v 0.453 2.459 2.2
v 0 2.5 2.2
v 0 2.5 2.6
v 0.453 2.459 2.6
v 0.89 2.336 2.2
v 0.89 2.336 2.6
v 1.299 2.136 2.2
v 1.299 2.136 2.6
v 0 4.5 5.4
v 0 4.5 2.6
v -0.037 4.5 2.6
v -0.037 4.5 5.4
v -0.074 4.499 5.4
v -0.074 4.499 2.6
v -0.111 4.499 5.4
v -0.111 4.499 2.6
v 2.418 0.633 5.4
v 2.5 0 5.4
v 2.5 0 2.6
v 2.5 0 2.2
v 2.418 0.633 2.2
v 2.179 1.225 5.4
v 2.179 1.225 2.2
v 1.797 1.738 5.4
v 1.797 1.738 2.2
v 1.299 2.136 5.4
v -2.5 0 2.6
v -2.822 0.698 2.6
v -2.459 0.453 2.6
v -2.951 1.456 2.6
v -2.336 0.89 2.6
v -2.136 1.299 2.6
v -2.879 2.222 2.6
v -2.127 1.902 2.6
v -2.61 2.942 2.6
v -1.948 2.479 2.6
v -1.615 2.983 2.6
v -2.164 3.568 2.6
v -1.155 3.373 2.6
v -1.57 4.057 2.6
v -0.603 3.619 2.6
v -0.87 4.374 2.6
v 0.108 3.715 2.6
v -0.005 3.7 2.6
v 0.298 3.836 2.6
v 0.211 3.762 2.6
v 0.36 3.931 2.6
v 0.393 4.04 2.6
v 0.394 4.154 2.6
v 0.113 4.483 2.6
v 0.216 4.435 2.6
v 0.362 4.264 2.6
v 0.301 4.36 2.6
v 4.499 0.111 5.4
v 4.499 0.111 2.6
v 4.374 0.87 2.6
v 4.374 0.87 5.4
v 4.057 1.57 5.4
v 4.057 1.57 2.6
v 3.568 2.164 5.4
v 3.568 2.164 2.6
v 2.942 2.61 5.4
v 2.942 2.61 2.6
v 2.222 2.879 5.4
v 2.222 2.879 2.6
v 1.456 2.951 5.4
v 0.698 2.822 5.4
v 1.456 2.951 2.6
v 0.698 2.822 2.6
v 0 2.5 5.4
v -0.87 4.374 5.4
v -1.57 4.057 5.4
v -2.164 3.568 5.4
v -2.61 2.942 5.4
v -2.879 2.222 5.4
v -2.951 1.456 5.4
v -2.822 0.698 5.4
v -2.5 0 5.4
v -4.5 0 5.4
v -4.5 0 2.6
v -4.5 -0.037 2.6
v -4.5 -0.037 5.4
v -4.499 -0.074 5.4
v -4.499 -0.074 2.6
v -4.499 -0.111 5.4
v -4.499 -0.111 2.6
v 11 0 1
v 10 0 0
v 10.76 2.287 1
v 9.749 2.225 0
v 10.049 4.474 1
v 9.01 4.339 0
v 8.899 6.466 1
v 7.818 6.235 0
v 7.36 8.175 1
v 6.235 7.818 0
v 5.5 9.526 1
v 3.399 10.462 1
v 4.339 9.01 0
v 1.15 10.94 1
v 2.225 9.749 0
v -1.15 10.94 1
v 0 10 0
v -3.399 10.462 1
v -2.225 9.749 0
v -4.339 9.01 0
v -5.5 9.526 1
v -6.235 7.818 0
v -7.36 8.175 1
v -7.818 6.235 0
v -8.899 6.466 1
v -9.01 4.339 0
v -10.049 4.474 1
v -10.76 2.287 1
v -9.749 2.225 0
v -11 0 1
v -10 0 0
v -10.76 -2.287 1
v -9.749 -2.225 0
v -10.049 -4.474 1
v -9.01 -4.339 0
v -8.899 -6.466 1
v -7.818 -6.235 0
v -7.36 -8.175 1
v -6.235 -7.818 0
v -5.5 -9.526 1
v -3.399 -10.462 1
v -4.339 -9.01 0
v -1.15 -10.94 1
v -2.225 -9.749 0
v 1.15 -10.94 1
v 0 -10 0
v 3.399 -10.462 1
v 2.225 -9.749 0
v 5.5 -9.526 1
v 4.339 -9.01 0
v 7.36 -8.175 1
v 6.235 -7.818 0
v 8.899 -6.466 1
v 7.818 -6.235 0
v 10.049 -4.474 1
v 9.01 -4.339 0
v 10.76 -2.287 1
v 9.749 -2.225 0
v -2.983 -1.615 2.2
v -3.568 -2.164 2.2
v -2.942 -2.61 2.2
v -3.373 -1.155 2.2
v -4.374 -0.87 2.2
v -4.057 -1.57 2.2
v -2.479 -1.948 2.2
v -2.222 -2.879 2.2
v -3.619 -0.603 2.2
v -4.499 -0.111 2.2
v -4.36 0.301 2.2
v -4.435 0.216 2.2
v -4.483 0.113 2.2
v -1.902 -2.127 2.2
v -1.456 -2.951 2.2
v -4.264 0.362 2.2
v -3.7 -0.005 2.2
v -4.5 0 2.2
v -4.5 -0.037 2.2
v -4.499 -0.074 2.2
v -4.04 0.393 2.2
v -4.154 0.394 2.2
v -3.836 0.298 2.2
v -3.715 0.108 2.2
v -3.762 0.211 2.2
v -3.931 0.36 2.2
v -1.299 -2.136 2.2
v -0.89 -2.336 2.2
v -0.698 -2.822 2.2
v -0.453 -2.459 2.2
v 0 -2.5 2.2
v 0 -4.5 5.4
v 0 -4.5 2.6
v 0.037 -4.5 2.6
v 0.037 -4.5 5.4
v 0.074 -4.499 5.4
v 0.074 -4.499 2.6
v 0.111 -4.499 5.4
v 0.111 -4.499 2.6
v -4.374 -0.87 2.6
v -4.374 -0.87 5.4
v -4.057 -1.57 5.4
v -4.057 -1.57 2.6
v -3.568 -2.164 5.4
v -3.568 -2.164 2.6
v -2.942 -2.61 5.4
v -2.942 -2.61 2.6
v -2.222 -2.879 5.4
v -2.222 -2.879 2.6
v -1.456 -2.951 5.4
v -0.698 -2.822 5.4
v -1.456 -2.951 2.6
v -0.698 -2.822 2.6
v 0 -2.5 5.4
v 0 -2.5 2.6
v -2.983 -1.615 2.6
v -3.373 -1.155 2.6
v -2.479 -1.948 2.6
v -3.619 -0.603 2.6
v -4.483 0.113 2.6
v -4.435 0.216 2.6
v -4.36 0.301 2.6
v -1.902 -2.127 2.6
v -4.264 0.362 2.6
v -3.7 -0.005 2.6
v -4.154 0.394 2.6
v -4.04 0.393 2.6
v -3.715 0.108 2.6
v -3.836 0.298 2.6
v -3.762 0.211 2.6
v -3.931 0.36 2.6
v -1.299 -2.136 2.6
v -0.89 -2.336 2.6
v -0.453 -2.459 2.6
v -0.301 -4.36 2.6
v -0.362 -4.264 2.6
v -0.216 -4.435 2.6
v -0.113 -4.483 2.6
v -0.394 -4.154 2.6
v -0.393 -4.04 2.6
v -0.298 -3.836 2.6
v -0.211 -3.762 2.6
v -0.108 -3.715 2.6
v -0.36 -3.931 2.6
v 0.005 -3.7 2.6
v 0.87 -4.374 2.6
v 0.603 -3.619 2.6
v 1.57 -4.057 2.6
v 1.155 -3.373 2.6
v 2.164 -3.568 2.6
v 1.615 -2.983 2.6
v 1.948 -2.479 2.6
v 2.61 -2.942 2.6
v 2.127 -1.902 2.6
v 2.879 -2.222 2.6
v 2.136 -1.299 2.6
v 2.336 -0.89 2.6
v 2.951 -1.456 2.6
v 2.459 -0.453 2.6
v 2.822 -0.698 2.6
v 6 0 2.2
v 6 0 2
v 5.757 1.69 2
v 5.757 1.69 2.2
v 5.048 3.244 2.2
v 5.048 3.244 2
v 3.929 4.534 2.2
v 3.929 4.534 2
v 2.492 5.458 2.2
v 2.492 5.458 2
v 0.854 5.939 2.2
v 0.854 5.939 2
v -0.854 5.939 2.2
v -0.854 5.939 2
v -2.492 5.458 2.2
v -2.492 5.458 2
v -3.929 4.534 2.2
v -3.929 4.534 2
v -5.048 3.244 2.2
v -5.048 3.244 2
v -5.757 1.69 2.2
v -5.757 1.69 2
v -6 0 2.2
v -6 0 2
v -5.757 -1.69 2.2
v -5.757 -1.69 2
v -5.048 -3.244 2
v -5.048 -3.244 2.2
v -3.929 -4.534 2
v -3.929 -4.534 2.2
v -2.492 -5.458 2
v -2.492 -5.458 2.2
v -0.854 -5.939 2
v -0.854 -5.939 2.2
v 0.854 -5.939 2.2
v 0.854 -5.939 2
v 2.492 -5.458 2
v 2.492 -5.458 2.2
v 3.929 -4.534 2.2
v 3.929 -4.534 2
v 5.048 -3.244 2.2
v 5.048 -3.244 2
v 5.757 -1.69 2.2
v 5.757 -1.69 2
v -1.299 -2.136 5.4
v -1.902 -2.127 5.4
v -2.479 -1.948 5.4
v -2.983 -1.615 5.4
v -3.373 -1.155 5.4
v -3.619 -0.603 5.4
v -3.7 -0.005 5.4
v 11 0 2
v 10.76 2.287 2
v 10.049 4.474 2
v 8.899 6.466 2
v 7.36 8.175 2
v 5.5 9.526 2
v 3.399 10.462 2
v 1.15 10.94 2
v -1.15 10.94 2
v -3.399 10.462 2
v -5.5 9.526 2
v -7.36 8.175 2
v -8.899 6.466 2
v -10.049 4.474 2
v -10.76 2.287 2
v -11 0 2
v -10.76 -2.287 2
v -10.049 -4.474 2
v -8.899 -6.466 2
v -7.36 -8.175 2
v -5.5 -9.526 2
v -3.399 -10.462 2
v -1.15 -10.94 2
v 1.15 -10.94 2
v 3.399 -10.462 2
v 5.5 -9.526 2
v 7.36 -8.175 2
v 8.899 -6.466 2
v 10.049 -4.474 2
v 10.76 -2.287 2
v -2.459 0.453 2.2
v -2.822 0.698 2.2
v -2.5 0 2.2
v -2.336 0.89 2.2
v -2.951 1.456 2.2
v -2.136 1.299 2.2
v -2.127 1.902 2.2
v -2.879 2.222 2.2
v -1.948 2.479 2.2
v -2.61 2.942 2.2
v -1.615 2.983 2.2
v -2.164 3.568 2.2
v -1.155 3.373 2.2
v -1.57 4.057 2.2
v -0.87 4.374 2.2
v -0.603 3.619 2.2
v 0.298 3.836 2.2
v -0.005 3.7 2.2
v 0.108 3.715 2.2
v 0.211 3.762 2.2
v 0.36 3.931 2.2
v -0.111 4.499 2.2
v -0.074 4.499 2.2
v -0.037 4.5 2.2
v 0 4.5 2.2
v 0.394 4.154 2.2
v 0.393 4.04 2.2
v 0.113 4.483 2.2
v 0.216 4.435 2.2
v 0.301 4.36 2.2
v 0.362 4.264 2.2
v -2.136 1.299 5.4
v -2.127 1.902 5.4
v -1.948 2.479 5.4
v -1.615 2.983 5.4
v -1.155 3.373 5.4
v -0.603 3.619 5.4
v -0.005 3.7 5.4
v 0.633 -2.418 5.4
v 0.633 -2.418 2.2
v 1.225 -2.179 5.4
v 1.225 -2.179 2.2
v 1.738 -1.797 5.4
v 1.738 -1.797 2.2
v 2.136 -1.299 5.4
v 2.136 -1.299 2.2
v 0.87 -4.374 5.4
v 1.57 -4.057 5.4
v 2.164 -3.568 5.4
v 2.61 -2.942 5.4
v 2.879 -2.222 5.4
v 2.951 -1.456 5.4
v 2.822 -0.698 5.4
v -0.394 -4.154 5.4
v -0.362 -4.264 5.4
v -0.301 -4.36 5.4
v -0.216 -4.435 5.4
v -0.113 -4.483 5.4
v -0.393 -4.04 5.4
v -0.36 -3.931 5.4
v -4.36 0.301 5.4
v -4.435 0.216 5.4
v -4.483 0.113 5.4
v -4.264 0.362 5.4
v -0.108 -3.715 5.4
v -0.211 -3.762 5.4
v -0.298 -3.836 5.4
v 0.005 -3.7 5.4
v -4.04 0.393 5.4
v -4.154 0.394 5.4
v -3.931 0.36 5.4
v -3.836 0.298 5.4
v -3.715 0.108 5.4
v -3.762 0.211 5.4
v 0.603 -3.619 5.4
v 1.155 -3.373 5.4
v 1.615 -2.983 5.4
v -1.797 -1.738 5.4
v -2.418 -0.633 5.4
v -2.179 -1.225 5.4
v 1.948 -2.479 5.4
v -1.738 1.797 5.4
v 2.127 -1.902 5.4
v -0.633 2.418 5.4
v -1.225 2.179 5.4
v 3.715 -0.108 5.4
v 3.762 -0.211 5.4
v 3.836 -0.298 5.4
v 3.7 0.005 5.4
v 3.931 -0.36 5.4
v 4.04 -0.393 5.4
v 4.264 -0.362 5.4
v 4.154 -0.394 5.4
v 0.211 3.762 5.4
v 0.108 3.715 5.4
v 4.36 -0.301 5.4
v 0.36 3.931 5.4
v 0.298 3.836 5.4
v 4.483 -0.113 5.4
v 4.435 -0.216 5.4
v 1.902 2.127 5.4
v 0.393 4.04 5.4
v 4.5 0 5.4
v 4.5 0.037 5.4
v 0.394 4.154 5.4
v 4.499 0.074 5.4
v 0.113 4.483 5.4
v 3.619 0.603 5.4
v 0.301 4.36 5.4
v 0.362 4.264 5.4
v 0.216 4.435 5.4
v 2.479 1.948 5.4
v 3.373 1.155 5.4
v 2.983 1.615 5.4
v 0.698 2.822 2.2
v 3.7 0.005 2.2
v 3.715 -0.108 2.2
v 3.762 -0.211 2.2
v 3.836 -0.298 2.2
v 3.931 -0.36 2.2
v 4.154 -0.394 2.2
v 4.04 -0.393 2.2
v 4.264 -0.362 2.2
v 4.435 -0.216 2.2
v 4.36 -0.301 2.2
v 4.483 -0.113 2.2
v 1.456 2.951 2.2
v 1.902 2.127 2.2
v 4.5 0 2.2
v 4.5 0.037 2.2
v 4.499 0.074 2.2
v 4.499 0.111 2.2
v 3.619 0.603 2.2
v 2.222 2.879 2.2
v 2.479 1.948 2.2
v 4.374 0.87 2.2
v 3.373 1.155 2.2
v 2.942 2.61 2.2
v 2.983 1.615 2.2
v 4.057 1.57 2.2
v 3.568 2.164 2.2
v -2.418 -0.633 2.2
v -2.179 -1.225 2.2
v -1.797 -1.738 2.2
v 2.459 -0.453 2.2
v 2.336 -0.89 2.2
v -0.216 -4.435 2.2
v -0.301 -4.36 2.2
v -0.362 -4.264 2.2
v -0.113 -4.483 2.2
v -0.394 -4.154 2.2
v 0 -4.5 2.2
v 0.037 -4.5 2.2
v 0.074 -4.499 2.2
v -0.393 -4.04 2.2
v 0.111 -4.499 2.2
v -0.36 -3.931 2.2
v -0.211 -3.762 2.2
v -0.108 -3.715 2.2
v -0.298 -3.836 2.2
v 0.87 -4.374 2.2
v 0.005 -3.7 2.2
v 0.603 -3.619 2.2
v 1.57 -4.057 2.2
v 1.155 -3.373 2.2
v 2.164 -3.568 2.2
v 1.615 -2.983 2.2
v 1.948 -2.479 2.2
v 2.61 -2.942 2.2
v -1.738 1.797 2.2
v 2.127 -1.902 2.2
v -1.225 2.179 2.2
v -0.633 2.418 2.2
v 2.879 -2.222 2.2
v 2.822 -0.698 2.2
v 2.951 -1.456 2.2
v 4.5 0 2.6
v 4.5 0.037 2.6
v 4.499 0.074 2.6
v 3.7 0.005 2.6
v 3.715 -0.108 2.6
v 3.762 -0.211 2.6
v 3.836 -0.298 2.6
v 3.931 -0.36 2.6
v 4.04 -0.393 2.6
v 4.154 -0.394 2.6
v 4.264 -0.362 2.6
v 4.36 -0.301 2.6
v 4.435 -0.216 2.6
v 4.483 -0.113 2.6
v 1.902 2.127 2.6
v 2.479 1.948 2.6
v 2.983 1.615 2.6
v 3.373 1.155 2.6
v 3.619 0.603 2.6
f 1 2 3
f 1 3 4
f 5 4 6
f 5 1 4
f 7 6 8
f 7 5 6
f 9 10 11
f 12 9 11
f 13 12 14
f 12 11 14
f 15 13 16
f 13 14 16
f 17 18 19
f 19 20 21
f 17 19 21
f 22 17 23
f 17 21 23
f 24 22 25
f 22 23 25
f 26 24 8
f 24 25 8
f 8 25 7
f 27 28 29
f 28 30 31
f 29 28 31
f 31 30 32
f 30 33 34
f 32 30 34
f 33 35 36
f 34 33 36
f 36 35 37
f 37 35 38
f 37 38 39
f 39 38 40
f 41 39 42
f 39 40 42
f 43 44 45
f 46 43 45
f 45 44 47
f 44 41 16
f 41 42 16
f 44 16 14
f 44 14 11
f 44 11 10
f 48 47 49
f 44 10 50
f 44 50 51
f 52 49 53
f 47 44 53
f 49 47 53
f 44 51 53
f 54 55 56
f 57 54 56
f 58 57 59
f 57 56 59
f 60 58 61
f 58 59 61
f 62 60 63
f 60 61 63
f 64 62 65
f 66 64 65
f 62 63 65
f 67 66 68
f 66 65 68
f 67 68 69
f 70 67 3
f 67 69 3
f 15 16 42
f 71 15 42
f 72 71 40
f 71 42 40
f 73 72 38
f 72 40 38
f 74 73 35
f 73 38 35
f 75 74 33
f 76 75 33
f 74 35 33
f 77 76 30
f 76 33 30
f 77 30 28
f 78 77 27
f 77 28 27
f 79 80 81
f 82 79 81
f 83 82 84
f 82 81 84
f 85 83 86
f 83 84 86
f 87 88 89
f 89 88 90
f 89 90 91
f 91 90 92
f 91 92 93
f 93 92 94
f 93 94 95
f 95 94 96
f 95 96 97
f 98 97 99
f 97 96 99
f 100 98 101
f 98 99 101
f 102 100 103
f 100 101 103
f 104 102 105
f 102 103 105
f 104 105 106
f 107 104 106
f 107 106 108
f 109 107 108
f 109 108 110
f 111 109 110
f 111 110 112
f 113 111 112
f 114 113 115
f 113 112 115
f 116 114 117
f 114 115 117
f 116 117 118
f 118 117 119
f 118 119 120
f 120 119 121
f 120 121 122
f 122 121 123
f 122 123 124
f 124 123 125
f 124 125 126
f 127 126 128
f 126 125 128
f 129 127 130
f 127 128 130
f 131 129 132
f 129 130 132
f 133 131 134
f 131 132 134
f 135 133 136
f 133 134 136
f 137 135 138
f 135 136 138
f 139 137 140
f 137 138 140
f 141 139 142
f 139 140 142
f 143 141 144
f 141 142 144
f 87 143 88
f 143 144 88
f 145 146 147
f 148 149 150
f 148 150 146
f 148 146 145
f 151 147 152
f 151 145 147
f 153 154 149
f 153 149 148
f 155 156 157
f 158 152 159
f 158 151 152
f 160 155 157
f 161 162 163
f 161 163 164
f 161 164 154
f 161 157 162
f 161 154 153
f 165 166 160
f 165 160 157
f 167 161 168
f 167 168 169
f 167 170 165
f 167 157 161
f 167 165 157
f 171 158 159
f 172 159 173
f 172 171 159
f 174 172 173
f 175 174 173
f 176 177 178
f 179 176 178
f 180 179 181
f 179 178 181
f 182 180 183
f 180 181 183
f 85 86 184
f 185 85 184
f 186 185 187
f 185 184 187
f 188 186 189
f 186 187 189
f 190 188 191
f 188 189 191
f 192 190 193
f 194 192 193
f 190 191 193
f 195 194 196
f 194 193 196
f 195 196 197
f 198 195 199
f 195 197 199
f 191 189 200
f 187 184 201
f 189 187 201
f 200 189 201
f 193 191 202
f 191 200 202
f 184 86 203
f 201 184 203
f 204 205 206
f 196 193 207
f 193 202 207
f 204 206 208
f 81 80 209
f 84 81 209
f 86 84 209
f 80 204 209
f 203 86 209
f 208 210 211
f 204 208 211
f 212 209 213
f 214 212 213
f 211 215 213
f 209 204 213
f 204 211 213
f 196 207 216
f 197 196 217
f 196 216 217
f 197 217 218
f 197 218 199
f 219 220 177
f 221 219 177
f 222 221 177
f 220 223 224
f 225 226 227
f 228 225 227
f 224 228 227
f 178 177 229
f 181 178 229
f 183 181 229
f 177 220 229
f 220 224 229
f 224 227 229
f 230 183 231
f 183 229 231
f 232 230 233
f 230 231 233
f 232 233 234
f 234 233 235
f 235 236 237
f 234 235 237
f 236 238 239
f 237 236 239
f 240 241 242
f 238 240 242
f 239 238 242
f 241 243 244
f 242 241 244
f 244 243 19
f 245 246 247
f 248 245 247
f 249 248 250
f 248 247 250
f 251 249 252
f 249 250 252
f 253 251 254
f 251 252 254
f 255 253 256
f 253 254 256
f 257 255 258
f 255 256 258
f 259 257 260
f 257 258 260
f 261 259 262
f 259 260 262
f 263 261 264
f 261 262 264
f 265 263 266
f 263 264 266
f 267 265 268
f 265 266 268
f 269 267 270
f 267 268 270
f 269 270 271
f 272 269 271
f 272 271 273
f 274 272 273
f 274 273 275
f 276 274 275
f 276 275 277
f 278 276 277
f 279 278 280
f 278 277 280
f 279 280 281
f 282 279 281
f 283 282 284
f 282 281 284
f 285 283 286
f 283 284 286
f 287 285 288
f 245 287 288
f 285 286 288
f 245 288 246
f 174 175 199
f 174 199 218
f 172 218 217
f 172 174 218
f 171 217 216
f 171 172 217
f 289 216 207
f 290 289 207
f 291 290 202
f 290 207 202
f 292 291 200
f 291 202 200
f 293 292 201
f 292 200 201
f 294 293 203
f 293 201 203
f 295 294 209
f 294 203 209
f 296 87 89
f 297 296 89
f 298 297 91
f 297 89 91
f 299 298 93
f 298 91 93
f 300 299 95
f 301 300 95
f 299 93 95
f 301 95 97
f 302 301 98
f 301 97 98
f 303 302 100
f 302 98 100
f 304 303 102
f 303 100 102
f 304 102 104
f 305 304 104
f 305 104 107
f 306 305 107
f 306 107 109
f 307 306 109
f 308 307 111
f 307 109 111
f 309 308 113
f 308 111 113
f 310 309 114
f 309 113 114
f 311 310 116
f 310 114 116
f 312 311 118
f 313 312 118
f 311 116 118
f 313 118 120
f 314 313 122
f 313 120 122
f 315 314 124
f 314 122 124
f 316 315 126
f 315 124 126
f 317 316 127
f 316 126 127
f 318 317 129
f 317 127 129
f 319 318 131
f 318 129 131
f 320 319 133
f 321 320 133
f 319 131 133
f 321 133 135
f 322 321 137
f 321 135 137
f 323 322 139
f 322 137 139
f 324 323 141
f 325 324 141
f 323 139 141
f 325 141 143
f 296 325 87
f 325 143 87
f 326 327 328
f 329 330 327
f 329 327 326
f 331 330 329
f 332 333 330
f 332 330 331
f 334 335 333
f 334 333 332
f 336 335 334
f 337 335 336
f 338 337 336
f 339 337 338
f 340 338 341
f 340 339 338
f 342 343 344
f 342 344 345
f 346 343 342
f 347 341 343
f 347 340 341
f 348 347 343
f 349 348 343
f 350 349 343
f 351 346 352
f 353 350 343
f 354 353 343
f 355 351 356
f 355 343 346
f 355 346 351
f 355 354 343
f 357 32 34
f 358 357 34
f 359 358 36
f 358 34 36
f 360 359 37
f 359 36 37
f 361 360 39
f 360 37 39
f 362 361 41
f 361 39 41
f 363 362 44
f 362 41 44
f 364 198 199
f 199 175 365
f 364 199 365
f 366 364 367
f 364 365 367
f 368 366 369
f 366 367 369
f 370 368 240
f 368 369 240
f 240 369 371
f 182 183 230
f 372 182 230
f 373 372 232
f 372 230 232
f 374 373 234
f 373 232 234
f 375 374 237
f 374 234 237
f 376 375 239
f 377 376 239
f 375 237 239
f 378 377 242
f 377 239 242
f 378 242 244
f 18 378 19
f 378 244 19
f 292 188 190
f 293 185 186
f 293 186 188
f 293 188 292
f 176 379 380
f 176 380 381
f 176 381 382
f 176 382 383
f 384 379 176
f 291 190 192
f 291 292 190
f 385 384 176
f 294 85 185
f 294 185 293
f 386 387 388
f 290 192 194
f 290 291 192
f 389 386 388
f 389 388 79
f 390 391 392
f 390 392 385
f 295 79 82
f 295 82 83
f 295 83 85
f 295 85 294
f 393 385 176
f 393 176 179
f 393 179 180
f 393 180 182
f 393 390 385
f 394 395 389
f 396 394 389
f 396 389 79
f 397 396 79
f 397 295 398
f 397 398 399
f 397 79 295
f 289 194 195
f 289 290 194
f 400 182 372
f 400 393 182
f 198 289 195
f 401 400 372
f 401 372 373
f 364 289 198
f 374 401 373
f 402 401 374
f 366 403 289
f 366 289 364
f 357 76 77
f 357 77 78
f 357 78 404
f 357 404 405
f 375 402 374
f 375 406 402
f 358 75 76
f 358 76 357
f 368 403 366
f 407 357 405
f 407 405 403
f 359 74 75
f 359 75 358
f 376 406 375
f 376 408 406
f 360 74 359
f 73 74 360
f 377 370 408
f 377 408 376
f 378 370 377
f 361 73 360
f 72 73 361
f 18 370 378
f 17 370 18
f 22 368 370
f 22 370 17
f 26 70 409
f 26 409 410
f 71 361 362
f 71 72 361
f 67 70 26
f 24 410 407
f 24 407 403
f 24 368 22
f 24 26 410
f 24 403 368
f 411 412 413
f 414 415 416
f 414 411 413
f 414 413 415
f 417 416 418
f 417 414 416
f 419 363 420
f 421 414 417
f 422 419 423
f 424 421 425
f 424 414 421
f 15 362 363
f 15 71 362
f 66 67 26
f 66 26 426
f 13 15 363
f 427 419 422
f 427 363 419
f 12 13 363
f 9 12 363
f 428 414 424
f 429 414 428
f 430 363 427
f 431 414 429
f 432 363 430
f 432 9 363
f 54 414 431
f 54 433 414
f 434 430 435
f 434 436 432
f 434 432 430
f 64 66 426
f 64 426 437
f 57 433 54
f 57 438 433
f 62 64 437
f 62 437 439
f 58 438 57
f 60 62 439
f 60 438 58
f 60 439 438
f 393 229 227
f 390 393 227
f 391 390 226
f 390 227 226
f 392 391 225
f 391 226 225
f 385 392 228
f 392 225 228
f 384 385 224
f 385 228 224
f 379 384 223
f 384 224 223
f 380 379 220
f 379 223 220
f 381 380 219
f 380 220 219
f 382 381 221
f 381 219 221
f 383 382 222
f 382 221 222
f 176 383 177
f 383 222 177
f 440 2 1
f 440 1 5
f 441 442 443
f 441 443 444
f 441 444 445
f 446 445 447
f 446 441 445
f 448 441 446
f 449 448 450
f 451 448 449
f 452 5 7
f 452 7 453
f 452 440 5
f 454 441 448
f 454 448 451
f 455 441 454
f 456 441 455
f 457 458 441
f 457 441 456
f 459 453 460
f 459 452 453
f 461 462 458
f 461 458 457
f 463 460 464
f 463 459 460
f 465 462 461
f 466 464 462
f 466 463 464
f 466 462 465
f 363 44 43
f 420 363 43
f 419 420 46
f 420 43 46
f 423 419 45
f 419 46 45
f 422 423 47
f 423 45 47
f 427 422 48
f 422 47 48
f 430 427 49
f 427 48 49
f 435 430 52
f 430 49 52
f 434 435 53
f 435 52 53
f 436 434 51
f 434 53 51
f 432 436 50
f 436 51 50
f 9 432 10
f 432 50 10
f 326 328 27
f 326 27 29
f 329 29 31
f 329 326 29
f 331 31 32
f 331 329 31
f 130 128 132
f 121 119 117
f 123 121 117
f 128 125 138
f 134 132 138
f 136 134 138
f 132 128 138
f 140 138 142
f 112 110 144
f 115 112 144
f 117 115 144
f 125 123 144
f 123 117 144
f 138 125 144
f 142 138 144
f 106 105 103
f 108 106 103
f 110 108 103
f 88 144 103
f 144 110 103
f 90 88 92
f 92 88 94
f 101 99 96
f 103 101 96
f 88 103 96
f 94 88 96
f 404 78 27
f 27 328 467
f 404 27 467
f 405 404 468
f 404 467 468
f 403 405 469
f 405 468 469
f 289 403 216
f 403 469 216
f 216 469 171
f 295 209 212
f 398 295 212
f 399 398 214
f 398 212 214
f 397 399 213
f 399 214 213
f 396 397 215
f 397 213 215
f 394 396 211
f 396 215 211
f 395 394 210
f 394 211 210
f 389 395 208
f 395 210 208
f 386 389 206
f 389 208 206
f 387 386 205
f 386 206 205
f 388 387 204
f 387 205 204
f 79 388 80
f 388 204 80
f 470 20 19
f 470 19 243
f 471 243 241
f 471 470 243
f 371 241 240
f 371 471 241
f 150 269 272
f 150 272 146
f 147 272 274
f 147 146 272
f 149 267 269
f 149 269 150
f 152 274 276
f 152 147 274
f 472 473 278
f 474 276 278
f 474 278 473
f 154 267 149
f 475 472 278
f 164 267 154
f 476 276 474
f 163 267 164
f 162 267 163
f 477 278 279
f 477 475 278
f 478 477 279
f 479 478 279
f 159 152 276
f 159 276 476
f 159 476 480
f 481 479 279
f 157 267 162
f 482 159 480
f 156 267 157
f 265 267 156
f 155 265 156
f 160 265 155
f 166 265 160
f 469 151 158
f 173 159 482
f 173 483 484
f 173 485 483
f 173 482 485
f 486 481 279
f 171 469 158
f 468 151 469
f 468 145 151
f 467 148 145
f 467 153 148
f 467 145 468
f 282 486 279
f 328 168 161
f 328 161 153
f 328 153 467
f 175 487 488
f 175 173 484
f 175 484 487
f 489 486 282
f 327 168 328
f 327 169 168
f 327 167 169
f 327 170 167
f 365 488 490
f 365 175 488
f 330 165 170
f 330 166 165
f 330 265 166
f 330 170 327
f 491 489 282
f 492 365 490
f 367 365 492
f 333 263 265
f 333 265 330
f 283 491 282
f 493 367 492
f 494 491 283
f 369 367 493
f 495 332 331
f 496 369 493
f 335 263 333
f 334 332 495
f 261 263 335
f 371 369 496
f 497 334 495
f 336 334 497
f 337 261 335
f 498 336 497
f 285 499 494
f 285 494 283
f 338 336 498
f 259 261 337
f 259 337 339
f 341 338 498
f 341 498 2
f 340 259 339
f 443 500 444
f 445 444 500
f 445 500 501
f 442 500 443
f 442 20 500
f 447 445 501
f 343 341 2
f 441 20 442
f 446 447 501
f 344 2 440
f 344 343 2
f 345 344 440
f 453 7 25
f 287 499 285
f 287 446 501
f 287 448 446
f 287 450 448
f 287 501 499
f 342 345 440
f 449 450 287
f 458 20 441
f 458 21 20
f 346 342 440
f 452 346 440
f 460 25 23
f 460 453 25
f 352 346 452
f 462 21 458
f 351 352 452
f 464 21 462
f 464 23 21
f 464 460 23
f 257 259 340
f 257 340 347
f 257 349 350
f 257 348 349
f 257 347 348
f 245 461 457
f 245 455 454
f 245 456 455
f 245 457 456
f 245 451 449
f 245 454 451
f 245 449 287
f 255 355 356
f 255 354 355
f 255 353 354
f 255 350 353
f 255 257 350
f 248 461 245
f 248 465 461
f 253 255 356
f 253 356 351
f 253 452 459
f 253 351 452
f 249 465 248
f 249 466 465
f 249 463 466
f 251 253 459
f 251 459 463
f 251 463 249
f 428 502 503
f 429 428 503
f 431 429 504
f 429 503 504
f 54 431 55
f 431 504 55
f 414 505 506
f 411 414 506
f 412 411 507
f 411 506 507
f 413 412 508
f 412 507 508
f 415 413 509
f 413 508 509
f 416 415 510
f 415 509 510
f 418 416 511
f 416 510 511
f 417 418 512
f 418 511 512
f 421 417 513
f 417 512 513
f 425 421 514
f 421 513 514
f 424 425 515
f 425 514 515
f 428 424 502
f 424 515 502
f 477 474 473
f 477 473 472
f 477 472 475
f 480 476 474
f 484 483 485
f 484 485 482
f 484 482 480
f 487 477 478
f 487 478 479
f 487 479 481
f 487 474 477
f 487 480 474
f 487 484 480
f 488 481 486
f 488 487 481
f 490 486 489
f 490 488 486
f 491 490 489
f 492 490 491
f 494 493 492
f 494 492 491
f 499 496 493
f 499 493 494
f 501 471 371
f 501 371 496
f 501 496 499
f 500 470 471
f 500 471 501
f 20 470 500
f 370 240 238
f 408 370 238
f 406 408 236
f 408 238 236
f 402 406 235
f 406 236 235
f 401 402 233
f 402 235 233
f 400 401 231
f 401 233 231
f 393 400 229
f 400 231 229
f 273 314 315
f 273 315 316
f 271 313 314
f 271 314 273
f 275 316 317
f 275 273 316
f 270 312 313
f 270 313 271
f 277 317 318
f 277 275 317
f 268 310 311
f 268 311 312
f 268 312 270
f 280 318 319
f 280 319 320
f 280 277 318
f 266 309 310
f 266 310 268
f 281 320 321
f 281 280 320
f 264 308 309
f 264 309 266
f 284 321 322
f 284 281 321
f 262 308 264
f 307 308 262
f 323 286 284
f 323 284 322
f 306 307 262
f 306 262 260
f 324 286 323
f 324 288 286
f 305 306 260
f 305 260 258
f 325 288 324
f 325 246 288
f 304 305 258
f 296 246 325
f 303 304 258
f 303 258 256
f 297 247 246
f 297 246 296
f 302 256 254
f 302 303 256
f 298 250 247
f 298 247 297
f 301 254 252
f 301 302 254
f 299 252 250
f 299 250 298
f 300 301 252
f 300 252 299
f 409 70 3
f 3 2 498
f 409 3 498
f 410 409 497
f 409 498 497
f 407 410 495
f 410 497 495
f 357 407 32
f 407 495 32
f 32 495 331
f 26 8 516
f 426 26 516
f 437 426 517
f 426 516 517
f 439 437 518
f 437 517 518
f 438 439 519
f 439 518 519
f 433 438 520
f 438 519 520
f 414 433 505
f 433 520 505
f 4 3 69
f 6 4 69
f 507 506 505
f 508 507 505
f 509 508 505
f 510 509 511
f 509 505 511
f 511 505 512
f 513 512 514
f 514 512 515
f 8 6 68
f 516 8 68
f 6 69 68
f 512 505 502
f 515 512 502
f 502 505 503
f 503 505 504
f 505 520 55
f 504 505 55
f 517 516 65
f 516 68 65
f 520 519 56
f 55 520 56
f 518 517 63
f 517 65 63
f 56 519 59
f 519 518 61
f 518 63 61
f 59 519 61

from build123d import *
from build123d import SkipClean  # not in build123d's __all__

# Parameters (mm, degrees)
F0_R     = 11
F1_DEPTH = 2
F2_SIZE  = 1
F3_R     = 6
F4_DEPTH = 0.2
F6_DEPTH = 3.2
F7_DEPTH = 0.4


with BuildPart() as f1:
    # F0 (on Top) → F1 (new body)
    with BuildSketch(Plane.XY):
        Circle(F0_R)
    extrude(amount=F1_DEPTH)

    # F2
    f2_edges = [f1.edges().sort_by_distance(p)[0] for p in [
        (-11, 0, 0),
    ]]
    chamfer(f2_edges, length=F2_SIZE)

    # F3 (on face) → F4 (join)
    with BuildSketch(Plane.XY.offset(2)):
        Circle(F3_R)
    extrude(amount=F4_DEPTH)

    # F5 (on face) → F6 (join)
    with BuildSketch(Plane.XY.offset(2.2)):
        with BuildLine():
            ThreePointArc((-0.0052788349, 3.7000174165), (0.3973518743, 4.0973692908), (0, 4.5))
            ThreePointArc((0, 4.5), (-0.0556126102, 4.4996563466), (-0.1112167263, 4.4986254389))
            ThreePointArc((-0.1112167263, 4.4986254389), (-2.6104676107, 2.9421967987), (-2.5, 0))
            ThreePointArc((-2.5, 0), (-2.4073466074, 0.6743013511), (-2.1362541503, 1.2986216559))
            ThreePointArc((-2.1362541503, 1.2986216559), (-1.6153328632, 2.9825624536), (-0.0052788349, 3.7000174165))
        make_face()
        with BuildLine():
            ThreePointArc((3.7000174165, 0.0052788349), (4.0973692908, -0.3973518743), (4.5, 0))
            ThreePointArc((4.5, 0), (4.4996563466, 0.0556126102), (4.4986254389, 0.1112167263))
            ThreePointArc((4.4986254389, 0.1112167263), (2.9421967987, 2.6104676107), (0, 2.5))
            ThreePointArc((0, 2.5), (0.6743013511, 2.4073466074), (1.2986216559, 2.1362541503))
            ThreePointArc((1.2986216559, 2.1362541503), (2.9825624536, 1.6153328632), (3.7000174165, 0.0052788349))
        make_face()
        with BuildLine():
            ThreePointArc((0, -4.5), (0.0556126102, -4.4996563466), (0.1112167263, -4.4986254389))
            ThreePointArc((0.1112167263, -4.4986254389), (2.6104676107, -2.9421967987), (2.5, 0))
            ThreePointArc((2.5, 0), (2.4073466074, -0.6743013511), (2.1362541503, -1.2986216559))
            ThreePointArc((2.1362541503, -1.2986216559), (1.6153328632, -2.9825624536), (0.0052788349, -3.7000174165))
            ThreePointArc((0.0052788349, -3.7000174165), (-0.3973518743, -4.0973692908), (0, -4.5))
        make_face()
        with BuildLine():
            ThreePointArc((-4.5, 0), (-4.4996563466, -0.0556126102), (-4.4986254389, -0.1112167263))
            ThreePointArc((-4.4986254389, -0.1112167263), (-2.9421967987, -2.6104676107), (0, -2.5))
            ThreePointArc((0, -2.5), (-0.6743013511, -2.4073466074), (-1.2986216559, -2.1362541503))
            ThreePointArc((-1.2986216559, -2.1362541503), (-2.9825624536, -1.6153328632), (-3.7000174165, -0.0052788349))
            ThreePointArc((-3.7000174165, -0.0052788349), (-4.0973692908, 0.3973518743), (-4.5, 0))
        make_face()
        with BuildLine():
            ThreePointArc((1.2986216559, 2.1362541503), (0.6743013511, 2.4073466074), (0, 2.5))
            ThreePointArc((0, 2.5), (-1.2254480528, 2.1790541686), (-2.1362541503, 1.2986216559))
            ThreePointArc((-2.1362541503, 1.2986216559), (-2.4073466074, 0.6743013511), (-2.5, 0))
            ThreePointArc((-2.5, 0), (-2.1790541686, -1.2254480528), (-1.2986216559, -2.1362541503))
            ThreePointArc((-1.2986216559, -2.1362541503), (-0.6743013511, -2.4073466074), (0, -2.5))
            ThreePointArc((0, -2.5), (1.2254480528, -2.1790541686), (2.1362541503, -1.2986216559))
            ThreePointArc((2.1362541503, -1.2986216559), (2.4073466074, -0.6743013511), (2.5, 0))
            ThreePointArc((2.5, 0), (2.1790541686, 1.2254480528), (1.2986216559, 2.1362541503))
        make_face()
    extrude(amount=F6_DEPTH)

    # F5 (on face) → F7 (cut)
    with BuildSketch(Plane.XY.offset(2.2)):
        with BuildLine():
            ThreePointArc((-4.5, 0), (-4.4996563466, -0.0556126102), (-4.4986254389, -0.1112167263))
            ThreePointArc((-4.4986254389, -0.1112167263), (-2.9421967987, -2.6104676107), (0, -2.5))
            ThreePointArc((0, -2.5), (-0.6743013511, -2.4073466074), (-1.2986216559, -2.1362541503))
            ThreePointArc((-1.2986216559, -2.1362541503), (-2.9825624536, -1.6153328632), (-3.7000174165, -0.0052788349))
            ThreePointArc((-3.7000174165, -0.0052788349), (-4.0973692908, 0.3973518743), (-4.5, 0))
        make_face()
        with BuildLine():
            ThreePointArc((-0.0052788349, 3.7000174165), (0.3973518743, 4.0973692908), (0, 4.5))
            ThreePointArc((0, 4.5), (-0.0556126102, 4.4996563466), (-0.1112167263, 4.4986254389))
            ThreePointArc((-0.1112167263, 4.4986254389), (-2.6104676107, 2.9421967987), (-2.5, 0))
            ThreePointArc((-2.5, 0), (-2.4073466074, 0.6743013511), (-2.1362541503, 1.2986216559))
            ThreePointArc((-2.1362541503, 1.2986216559), (-1.6153328632, 2.9825624536), (-0.0052788349, 3.7000174165))
        make_face()
        with BuildLine():
            ThreePointArc((3.7000174165, 0.0052788349), (4.0973692908, -0.3973518743), (4.5, 0))
            ThreePointArc((4.5, 0), (4.4996563466, 0.0556126102), (4.4986254389, 0.1112167263))
            ThreePointArc((4.4986254389, 0.1112167263), (2.9421967987, 2.6104676107), (0, 2.5))
            ThreePointArc((0, 2.5), (0.6743013511, 2.4073466074), (1.2986216559, 2.1362541503))
            ThreePointArc((1.2986216559, 2.1362541503), (2.9825624536, 1.6153328632), (3.7000174165, 0.0052788349))
        make_face()
        with BuildLine():
            ThreePointArc((0, -4.5), (0.0556126102, -4.4996563466), (0.1112167263, -4.4986254389))
            ThreePointArc((0.1112167263, -4.4986254389), (2.6104676107, -2.9421967987), (2.5, 0))
            ThreePointArc((2.5, 0), (2.4073466074, -0.6743013511), (2.1362541503, -1.2986216559))
            ThreePointArc((2.1362541503, -1.2986216559), (1.6153328632, -2.9825624536), (0.0052788349, -3.7000174165))
            ThreePointArc((0.0052788349, -3.7000174165), (-0.3973518743, -4.0973692908), (0, -4.5))
        make_face()
    with SkipClean():  # cleaning this boolean's faces spoils the solid; the shape is the same uncleaned
        extrude(amount=F7_DEPTH, mode=Mode.SUBTRACT)


solid = f1.part
